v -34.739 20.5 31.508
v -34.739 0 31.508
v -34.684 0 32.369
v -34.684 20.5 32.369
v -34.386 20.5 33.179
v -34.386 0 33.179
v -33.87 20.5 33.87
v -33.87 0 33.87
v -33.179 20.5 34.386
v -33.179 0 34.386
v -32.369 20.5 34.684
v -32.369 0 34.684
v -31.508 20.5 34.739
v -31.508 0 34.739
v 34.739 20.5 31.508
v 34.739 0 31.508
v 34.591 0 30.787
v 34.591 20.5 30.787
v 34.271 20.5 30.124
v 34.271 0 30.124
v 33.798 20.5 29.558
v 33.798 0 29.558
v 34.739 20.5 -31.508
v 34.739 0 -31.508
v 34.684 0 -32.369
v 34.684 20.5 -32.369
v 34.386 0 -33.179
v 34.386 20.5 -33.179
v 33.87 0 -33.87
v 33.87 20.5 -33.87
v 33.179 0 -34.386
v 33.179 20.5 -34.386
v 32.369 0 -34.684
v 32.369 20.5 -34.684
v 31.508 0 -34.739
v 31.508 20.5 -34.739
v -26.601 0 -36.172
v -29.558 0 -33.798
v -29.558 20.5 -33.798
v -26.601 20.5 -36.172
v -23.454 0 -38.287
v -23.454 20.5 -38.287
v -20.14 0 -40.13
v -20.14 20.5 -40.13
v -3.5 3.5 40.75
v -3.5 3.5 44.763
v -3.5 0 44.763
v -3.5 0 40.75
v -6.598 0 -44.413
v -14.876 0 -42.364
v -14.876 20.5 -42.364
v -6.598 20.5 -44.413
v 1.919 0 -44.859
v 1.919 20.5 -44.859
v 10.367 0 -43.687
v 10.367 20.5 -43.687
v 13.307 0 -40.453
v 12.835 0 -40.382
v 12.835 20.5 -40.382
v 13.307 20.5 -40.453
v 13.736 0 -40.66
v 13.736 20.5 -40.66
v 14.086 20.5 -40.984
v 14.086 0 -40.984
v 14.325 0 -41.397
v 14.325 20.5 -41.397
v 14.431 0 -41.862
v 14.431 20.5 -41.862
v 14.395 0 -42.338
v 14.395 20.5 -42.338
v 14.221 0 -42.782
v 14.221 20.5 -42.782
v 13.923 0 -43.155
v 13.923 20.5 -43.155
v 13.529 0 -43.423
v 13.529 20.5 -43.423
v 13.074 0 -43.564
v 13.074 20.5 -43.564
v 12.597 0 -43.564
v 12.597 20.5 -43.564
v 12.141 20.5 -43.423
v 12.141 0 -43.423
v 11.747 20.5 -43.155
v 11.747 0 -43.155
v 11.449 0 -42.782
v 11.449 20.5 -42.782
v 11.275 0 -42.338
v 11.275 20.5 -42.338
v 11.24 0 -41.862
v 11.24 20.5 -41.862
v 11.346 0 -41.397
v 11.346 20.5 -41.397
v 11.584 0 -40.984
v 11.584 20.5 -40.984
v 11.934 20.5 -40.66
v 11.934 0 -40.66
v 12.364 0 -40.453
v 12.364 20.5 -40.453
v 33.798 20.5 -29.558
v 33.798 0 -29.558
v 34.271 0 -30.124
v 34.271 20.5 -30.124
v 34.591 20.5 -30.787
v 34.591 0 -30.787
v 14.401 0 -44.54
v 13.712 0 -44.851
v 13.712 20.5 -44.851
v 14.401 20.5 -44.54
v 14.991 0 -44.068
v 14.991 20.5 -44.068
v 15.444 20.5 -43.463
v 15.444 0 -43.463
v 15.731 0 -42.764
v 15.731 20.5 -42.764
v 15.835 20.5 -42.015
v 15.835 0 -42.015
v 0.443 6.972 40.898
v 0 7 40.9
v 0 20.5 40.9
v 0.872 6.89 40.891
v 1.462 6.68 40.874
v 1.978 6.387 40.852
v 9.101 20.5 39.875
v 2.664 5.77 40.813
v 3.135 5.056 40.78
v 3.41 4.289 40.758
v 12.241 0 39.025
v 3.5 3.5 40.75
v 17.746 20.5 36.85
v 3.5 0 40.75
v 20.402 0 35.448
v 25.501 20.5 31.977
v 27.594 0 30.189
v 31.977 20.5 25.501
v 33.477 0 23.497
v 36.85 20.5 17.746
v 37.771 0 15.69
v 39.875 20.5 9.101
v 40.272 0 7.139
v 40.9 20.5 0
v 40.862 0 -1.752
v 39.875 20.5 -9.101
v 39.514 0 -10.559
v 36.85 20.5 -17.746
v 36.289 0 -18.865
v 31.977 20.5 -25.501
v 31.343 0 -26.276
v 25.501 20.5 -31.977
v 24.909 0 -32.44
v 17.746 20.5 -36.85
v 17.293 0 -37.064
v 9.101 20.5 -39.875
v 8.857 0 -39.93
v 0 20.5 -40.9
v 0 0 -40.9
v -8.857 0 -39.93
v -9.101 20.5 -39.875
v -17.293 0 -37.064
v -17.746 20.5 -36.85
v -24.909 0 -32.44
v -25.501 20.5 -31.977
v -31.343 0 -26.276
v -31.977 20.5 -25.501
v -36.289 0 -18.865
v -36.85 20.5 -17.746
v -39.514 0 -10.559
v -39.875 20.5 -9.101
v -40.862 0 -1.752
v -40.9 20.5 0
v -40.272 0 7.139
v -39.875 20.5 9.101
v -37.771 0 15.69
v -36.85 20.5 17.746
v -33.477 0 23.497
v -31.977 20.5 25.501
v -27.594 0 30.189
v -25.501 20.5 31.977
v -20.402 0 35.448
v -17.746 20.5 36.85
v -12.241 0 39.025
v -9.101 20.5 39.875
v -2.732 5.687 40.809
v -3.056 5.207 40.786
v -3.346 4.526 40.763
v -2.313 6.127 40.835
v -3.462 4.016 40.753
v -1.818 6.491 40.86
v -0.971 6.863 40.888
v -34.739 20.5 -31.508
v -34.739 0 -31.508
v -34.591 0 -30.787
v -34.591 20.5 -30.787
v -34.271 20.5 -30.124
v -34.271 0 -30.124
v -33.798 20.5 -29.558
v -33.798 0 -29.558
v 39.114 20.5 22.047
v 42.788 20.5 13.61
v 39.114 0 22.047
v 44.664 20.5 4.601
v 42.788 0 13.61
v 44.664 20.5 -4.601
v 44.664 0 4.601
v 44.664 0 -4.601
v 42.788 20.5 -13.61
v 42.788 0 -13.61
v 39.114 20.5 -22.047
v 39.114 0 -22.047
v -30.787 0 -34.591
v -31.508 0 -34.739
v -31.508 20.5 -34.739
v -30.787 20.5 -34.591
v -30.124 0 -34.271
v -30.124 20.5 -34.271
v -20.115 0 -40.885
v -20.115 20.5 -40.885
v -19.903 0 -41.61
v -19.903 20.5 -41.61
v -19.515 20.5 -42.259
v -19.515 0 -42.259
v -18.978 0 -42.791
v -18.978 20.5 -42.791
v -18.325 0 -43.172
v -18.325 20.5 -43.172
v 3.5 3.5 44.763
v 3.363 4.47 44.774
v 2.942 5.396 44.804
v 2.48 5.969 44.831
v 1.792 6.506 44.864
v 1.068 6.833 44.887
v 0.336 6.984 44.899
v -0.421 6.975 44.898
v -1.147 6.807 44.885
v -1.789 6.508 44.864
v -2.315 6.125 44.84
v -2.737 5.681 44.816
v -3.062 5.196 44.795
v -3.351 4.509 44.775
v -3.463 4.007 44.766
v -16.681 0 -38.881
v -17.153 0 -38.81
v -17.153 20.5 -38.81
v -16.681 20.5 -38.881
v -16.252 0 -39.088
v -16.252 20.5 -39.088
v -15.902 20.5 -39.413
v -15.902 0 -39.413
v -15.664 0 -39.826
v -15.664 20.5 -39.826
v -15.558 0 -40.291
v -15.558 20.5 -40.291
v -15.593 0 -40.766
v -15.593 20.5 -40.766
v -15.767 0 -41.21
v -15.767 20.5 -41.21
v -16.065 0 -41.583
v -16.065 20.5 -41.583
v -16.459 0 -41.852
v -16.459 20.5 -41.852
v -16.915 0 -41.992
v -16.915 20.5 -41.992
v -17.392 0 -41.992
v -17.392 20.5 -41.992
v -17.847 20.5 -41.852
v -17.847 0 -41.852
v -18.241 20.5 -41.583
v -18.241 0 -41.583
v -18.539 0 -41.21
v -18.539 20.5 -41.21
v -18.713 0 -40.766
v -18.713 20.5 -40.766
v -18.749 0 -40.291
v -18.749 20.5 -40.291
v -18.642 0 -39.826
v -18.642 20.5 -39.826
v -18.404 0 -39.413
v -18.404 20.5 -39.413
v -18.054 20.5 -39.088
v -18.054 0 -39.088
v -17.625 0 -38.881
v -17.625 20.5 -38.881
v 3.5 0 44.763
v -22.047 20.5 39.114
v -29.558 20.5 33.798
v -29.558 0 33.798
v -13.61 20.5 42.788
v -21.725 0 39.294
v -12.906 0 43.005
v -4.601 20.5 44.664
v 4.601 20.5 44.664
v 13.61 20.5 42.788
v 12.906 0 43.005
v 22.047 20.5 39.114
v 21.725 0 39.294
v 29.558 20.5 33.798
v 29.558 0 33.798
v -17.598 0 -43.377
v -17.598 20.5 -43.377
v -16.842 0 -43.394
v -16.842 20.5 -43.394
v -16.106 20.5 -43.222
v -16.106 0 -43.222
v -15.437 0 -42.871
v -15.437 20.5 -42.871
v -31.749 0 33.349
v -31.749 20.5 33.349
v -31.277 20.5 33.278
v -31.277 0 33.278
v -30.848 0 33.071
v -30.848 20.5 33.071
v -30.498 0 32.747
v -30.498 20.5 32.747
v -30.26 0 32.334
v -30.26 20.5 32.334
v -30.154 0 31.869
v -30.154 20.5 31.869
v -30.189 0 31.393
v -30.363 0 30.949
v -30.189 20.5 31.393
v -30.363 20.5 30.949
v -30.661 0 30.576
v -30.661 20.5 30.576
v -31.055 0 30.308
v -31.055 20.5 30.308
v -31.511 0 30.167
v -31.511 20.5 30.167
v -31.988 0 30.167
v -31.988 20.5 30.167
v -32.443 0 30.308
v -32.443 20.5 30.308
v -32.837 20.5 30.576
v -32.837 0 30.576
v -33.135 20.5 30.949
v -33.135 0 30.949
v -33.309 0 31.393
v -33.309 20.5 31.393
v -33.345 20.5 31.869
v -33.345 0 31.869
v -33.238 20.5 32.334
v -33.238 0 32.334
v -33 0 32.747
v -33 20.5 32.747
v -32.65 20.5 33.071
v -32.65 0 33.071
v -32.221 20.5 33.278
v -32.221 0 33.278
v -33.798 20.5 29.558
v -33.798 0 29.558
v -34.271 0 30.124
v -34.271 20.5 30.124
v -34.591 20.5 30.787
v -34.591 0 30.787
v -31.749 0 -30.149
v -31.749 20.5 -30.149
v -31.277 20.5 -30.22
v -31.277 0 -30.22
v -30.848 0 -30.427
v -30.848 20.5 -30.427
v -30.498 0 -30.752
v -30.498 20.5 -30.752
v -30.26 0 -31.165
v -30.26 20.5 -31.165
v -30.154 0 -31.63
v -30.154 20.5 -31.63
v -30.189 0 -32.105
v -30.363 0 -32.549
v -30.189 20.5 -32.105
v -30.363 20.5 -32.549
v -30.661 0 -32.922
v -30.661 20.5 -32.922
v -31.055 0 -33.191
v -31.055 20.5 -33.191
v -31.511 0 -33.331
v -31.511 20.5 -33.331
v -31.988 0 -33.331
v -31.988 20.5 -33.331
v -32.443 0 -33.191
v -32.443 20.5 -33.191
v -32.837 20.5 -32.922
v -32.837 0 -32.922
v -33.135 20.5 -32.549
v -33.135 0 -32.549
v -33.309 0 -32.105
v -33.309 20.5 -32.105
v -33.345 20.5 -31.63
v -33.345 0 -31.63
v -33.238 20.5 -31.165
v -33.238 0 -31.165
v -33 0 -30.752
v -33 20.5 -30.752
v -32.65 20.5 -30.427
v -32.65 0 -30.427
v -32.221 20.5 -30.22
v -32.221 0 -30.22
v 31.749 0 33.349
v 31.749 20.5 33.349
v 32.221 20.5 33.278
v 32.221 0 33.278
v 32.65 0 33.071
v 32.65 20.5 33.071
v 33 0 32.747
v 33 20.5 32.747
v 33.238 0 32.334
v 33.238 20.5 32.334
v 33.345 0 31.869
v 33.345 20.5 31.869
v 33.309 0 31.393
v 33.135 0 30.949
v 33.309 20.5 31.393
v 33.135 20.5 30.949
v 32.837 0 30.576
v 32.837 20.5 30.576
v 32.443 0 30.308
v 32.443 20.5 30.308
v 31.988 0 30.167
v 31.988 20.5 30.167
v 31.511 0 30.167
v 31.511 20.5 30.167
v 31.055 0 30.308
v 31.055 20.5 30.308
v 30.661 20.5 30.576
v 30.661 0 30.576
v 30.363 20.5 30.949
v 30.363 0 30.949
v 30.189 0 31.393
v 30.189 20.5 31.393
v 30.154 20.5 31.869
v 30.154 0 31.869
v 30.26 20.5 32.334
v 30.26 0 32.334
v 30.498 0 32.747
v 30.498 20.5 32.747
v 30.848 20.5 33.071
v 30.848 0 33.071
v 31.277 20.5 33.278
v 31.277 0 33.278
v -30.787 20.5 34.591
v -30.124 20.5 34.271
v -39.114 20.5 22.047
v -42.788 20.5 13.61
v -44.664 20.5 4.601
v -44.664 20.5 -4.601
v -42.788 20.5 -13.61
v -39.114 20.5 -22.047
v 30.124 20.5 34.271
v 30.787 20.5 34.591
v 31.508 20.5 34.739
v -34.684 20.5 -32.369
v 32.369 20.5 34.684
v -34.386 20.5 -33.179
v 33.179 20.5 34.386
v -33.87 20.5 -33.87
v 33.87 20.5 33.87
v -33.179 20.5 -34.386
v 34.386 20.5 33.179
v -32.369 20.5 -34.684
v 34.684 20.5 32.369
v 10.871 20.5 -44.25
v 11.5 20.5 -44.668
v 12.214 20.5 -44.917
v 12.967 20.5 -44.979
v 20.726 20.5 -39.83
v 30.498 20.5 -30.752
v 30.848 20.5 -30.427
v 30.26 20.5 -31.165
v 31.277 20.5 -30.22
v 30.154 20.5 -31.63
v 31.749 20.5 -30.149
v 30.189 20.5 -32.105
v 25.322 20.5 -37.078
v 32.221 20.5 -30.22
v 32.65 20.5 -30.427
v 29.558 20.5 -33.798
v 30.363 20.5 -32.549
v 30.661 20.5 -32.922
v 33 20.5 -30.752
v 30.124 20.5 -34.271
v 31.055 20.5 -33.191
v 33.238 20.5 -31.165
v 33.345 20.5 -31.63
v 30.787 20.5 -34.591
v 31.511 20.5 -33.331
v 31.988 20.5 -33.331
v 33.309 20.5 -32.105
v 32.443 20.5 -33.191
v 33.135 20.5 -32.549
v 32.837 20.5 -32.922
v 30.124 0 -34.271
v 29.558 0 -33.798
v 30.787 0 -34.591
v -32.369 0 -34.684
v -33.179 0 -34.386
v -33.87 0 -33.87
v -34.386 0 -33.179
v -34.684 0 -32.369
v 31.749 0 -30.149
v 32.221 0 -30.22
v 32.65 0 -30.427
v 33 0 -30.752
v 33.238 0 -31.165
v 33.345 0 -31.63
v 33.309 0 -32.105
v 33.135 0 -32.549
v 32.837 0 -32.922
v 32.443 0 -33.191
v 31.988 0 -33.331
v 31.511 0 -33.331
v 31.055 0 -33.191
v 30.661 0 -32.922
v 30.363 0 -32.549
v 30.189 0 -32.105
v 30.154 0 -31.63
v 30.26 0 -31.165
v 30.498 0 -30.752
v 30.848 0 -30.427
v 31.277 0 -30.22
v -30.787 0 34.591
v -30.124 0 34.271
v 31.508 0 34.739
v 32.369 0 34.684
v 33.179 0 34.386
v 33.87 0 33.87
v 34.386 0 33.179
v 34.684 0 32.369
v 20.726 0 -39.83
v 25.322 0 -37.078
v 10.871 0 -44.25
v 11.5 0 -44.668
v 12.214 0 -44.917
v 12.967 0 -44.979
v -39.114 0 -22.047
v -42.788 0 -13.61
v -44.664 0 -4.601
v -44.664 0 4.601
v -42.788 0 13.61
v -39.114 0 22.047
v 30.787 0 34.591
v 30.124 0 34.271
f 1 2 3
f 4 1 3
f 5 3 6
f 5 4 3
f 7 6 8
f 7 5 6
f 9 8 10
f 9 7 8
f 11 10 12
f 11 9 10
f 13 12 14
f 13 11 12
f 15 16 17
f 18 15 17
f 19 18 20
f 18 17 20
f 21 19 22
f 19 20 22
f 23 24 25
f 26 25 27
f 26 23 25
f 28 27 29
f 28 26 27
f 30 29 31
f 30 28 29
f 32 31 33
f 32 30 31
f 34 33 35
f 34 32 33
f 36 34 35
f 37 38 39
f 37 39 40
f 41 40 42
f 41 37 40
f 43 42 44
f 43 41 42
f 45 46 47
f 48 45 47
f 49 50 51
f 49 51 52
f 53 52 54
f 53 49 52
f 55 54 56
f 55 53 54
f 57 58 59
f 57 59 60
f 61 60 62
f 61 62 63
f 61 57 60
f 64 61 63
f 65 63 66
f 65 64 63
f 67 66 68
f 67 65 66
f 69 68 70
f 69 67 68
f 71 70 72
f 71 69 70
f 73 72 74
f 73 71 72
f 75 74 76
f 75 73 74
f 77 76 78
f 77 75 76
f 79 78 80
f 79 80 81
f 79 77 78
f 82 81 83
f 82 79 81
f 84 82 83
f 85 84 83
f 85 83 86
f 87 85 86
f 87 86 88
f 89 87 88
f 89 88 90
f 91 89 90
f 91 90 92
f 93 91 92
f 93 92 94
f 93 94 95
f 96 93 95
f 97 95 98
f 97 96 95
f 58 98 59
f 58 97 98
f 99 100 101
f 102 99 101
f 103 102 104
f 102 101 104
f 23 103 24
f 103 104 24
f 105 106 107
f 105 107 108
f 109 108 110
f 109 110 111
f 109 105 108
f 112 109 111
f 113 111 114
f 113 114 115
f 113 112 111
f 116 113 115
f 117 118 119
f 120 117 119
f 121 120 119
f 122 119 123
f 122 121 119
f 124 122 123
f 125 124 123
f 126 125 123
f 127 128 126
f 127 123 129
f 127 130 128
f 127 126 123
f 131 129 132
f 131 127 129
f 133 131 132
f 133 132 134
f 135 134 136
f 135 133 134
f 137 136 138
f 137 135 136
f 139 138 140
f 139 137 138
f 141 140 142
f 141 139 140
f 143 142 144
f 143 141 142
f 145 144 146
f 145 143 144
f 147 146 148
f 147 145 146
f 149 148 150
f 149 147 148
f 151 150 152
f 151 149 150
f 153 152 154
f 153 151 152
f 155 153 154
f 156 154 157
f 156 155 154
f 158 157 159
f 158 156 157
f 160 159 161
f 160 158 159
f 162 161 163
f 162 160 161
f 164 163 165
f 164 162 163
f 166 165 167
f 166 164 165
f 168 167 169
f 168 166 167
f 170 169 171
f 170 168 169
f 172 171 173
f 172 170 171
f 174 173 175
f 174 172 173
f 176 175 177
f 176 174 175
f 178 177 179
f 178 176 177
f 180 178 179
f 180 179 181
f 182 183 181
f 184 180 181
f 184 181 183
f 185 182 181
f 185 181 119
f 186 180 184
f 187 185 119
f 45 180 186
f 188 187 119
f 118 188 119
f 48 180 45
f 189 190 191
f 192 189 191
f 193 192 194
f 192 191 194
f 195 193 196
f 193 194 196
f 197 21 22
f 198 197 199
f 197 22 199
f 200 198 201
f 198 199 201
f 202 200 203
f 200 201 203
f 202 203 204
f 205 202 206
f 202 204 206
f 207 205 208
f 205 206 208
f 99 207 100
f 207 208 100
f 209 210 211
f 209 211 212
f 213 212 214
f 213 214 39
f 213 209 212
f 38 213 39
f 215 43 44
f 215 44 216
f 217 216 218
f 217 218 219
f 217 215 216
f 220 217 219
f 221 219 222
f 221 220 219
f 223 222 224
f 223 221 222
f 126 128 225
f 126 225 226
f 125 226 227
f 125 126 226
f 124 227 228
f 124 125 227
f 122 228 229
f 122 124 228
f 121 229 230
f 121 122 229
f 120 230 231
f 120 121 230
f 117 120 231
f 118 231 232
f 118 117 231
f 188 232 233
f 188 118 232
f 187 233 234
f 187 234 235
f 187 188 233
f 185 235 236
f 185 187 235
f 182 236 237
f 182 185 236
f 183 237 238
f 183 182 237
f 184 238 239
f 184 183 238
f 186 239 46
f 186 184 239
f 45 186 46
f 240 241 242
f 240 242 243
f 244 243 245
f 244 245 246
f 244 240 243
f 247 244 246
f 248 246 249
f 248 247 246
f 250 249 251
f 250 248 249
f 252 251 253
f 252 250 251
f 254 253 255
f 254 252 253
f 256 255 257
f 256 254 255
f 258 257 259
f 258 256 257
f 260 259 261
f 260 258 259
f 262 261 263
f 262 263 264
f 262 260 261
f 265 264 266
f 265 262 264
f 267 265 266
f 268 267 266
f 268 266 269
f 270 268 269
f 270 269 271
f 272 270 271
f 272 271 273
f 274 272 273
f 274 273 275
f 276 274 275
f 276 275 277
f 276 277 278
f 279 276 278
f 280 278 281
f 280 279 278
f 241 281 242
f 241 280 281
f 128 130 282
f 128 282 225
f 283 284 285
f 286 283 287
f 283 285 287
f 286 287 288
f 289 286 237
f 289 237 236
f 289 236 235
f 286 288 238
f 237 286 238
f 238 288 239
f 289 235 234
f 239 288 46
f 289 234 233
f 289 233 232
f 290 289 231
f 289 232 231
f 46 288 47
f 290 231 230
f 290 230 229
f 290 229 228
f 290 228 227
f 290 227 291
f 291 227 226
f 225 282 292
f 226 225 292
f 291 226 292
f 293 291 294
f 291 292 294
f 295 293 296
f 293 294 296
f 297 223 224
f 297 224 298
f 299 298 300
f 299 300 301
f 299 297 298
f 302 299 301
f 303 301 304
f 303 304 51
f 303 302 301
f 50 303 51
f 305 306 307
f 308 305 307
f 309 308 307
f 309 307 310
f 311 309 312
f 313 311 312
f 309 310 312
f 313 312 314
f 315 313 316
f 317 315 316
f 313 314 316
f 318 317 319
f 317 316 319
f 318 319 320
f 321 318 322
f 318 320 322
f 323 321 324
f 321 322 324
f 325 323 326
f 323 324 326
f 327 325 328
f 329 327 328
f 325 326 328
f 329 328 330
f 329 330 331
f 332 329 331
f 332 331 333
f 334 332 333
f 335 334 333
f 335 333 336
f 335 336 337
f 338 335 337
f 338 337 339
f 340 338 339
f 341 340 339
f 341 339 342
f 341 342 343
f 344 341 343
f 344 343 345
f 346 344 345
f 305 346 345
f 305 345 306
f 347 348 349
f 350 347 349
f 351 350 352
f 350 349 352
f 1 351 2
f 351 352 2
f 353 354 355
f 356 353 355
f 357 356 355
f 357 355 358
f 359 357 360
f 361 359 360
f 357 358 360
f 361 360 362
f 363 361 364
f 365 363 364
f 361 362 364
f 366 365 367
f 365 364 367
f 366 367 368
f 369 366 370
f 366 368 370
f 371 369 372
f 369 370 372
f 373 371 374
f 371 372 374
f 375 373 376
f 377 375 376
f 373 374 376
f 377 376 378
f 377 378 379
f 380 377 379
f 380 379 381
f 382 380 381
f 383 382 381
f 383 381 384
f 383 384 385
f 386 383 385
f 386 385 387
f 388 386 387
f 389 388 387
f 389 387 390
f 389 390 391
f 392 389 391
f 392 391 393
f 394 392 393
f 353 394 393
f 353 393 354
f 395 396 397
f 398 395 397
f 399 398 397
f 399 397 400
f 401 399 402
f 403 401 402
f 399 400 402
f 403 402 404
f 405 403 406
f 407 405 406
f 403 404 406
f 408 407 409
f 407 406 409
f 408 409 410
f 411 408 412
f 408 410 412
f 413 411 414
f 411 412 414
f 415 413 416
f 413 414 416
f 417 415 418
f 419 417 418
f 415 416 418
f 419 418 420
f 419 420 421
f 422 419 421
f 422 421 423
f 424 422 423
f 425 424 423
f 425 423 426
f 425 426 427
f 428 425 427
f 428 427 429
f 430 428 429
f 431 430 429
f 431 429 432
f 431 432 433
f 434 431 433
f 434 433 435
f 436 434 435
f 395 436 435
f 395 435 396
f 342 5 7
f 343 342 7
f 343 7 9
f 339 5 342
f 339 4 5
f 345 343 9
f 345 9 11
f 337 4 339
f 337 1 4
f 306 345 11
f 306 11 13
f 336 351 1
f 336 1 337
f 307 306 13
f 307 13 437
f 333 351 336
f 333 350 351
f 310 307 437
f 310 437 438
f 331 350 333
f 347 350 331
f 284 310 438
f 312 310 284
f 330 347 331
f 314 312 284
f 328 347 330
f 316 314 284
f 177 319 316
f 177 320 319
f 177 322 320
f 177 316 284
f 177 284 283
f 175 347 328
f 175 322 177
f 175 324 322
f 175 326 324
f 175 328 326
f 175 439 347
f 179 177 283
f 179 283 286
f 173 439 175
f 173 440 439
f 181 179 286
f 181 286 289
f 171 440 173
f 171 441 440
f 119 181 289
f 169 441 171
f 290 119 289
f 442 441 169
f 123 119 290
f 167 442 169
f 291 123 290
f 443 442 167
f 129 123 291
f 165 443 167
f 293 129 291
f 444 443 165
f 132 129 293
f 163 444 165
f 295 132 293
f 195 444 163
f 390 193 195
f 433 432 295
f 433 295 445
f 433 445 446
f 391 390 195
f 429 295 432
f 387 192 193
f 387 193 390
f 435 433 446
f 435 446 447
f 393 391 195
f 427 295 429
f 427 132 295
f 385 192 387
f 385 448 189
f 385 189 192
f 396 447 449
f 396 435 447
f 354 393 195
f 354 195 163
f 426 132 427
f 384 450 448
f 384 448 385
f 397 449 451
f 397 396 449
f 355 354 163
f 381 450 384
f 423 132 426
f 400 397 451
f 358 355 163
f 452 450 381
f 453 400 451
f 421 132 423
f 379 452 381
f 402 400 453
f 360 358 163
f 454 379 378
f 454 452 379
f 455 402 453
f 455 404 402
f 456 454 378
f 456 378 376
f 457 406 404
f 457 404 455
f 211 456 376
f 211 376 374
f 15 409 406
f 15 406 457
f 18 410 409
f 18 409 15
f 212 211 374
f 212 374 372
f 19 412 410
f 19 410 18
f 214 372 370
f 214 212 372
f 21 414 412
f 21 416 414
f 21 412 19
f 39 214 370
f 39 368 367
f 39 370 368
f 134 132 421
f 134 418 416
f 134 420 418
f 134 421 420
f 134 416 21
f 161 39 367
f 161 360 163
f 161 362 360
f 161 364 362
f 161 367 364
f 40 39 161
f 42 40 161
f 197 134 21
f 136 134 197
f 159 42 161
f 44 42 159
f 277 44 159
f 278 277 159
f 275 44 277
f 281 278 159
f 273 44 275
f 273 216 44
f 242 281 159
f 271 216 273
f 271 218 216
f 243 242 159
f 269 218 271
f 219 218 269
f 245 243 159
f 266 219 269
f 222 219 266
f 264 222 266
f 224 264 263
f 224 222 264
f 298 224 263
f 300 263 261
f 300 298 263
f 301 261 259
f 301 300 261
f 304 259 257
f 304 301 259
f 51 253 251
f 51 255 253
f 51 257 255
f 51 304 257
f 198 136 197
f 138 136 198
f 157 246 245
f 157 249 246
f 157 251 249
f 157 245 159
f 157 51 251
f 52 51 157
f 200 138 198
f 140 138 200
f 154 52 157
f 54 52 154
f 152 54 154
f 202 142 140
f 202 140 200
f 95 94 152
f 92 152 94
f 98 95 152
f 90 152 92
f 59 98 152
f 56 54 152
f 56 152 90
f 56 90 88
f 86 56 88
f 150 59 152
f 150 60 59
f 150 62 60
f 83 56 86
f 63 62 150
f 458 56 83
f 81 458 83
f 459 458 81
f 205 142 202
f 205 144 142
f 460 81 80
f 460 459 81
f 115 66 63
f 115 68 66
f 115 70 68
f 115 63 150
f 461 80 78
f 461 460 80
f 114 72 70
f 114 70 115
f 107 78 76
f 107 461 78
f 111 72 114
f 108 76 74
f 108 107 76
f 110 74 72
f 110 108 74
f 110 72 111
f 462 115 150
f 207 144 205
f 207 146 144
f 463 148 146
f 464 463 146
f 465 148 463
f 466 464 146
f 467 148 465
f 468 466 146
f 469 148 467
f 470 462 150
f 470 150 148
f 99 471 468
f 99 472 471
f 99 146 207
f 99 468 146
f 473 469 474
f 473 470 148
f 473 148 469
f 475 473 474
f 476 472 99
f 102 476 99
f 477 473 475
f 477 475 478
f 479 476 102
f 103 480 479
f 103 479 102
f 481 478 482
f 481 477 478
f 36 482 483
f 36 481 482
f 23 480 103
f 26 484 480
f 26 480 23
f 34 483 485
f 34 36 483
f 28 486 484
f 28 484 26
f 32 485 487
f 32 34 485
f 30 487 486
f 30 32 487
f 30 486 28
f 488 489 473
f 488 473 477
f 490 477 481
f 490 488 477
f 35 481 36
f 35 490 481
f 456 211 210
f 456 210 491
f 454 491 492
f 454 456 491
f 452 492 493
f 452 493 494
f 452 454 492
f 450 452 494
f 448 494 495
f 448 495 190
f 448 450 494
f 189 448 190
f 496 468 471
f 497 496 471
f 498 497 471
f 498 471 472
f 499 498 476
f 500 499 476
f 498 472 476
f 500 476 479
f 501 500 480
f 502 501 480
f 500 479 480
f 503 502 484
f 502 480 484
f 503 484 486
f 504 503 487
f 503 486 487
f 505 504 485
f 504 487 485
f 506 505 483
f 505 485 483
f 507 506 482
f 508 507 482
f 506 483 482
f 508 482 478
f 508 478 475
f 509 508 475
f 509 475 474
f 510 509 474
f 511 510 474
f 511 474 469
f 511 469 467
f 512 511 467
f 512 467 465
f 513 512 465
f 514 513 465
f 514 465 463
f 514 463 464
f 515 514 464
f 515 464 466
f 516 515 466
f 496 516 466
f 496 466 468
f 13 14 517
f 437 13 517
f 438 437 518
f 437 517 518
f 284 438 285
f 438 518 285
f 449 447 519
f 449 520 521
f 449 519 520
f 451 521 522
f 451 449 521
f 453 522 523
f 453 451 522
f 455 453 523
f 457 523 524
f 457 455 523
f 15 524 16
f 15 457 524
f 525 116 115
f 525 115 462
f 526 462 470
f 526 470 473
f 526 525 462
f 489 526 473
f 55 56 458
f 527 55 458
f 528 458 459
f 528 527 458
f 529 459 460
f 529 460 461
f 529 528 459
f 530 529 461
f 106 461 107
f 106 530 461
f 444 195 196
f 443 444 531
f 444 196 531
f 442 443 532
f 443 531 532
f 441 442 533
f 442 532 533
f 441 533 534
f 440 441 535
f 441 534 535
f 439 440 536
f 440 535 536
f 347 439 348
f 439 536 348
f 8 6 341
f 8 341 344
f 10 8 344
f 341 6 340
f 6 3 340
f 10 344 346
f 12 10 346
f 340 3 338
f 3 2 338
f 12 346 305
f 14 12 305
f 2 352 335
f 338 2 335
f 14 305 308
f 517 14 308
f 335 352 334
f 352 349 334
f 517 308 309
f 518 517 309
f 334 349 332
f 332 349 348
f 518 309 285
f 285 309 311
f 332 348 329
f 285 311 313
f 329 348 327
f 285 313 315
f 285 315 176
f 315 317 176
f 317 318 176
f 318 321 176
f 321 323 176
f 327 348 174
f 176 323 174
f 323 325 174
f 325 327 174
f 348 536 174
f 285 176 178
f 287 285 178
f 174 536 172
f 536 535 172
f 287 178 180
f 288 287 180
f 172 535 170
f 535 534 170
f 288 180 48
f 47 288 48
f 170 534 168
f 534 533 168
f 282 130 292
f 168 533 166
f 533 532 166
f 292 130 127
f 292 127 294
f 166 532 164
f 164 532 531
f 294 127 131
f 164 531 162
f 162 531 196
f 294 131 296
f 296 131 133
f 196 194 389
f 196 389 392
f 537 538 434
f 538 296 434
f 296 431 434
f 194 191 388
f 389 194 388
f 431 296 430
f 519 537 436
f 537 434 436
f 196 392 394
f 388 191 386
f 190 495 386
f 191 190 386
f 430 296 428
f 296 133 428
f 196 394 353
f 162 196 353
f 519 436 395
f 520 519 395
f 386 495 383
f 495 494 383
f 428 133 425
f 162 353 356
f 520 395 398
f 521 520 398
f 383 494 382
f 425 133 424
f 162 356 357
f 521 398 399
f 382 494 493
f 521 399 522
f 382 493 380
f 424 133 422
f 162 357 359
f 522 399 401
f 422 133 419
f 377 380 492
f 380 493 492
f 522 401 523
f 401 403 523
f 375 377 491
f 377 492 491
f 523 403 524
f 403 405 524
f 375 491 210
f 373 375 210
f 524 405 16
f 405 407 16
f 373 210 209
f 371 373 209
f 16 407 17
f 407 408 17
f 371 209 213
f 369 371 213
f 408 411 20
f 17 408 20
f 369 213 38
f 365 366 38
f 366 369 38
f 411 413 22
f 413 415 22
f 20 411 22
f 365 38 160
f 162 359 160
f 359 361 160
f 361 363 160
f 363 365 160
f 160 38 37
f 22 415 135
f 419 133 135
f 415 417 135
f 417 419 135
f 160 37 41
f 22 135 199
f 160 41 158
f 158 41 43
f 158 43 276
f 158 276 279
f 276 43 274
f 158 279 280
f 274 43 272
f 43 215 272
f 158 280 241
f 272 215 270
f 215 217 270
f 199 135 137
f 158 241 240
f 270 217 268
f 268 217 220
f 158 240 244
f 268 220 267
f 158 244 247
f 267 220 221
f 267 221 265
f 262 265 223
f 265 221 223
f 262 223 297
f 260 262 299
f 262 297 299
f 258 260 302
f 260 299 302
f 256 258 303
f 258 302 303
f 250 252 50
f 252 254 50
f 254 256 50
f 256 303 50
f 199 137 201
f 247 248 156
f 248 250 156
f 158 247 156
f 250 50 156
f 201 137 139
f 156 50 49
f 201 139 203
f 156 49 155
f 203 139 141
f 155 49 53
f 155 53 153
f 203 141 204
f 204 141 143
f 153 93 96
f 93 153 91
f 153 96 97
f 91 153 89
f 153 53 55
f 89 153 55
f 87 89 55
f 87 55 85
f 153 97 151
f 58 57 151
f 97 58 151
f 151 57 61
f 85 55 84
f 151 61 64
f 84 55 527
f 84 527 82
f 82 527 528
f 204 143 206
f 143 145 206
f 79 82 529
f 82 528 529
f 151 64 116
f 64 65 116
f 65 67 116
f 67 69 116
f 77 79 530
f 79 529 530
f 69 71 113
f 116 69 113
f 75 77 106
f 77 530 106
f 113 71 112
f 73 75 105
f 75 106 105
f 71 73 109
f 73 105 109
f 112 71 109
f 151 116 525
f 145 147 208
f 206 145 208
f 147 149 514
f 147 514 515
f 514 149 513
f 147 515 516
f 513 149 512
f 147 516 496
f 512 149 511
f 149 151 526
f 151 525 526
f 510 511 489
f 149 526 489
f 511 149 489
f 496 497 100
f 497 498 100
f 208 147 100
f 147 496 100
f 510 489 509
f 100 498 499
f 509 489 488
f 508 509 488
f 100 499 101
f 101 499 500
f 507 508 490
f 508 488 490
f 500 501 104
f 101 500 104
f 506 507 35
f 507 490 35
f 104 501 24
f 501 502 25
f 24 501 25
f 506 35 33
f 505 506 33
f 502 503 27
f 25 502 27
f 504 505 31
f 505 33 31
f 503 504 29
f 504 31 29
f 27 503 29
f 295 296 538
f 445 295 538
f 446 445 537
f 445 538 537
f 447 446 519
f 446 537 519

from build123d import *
from build123d.topology import SkipClean

# Parameters (mm, degrees)
SKETCH_1_R          = 46.9
SKETCH_1_R_2        = 40.9
SKETCH_1_R_3        = 1.6
EXTRUDE_1_DEPTH     = 20.5
SKETCH_2_R          = 3
EXTRUDE_2_DEPTH     = 20.5
SKETCH_3_R          = 1.6
CUT_EXTRUDE_1_DEPTH = 25
CUT_EXTRUDE_START   = -25
CUT_EXTRUDE_2_DEPTH = 25
CUT_EXTRUDE_3_DEPTH = 67.780389508


with BuildPart() as part:
    # 草图1 → 凸台-拉伸1 (new body)
    with BuildSketch(Plane(origin=(0, 0, 0), x_dir=(1, 0, 0), z_dir=(0, 1, 0))):
        with Locations(Location((0, 0, 0), (0, 0, 270))):
            Circle(SKETCH_1_R)
        with Locations(Location((0, 0, 0), (0, 0, 270))):
            Circle(SKETCH_1_R_2, mode=Mode.SUBTRACT)
        with Locations(Location((12.835117837, 41.981778787, 0), (0, 0, 270))):
            Circle(SKETCH_1_R_3, mode=Mode.SUBTRACT)
        with Locations(Location((-17.153096541, 40.410163067, 0), (0, 0, 270))):
            Circle(SKETCH_1_R_3, mode=Mode.SUBTRACT)
    extrude(amount=EXTRUDE_1_DEPTH)

    # 草图2 → 凸台-拉伸2 (add)
    with BuildSketch(Plane(origin=(0, 20.5, 0), x_dir=(1, 0, 0), z_dir=(0, 1, 0))):
        with Locations((31.749094475, 31.749094475)):
            Circle(SKETCH_2_R)
        with Locations((31.749094475, -31.749094475)):
            Circle(SKETCH_2_R)
        with Locations((-31.749094475, -31.749094475)):
            Circle(SKETCH_2_R)
        with Locations((-31.749094475, 31.749094475)):
            Circle(SKETCH_2_R)
    extrude(amount=-EXTRUDE_2_DEPTH)

    # 草图3 → 切除-拉伸1 (cut)
    with BuildSketch(Plane(origin=(0, 20.5, 0), x_dir=(1, 0, 0), z_dir=(0, 1, 0))):
        with Locations(Location((-31.749094475, 31.749094475, 0), (0, 0, 270))):
            Circle(SKETCH_3_R)
        with Locations(Location((-31.749094475, -31.749094475, 0), (0, 0, 270))):
            Circle(SKETCH_3_R)
        with Locations(Location((31.749094475, -31.749094475, 0), (0, 0, 270))):
            Circle(SKETCH_3_R)
        with Locations(Location((31.749094475, 31.749094475, 0), (0, 0, 270))):
            Circle(SKETCH_3_R)
    extrude(amount=-CUT_EXTRUDE_1_DEPTH, mode=Mode.SUBTRACT)

    # 草图4 → 切除-拉伸2 (cut)
    with SkipClean():  # the faces are left unmerged after this step: merging them gives an invalid solid
        with BuildSketch(Plane(origin=(0, 20.5, 0), x_dir=(1, 0, 0), z_dir=(0, 1, 0)).offset(CUT_EXTRUDE_START)):
            with BuildLine():
                ThreePointArc((-20.139957039, 40.129691383), (-19.729499495, 41.947091113), (-18.325289788, 43.171677686))
                ThreePointArc((-18.325289788, 43.171677686), (-25.271051327, 39.509289602), (-31.508446668, 34.739427004))
                ThreePointArc((-31.508446668, 34.739427004), (-30.445394472, 34.451013479), (-29.558090066, 33.798362559))
                ThreePointArc((-29.558090066, 33.798362559), (-25.049858336, 37.262777638), (-20.139957039, 40.129691383))
            make_face()
            with BuildLine():
                ThreePointArc((10.366766227, 43.686841932), (11.849397191, 44.815213947), (13.71223353, 44.850692878))
                ThreePointArc((13.71223353, 44.850692878), (-2.454555971, 46.8357252), (-18.325289788, 43.171677686))
                ThreePointArc((-18.325289788, 43.171677686), (-16.468950031, 43.331112151), (-14.876494449, 42.363898698))
                ThreePointArc((-14.876494449, 42.363898698), (-2.349884435, 44.83846611), (10.366766227, 43.686841932))
            make_face()
            with BuildLine():
                ThreePointArc((29.558090066, 33.798362559), (30.445394472, 34.451013479), (31.508446668, 34.739427004))
                ThreePointArc((31.508446668, 34.739427004), (23.168662106, 40.777727943), (13.71223353, 44.850692878))
                ThreePointArc((13.71223353, 44.850692878), (15.236754486, 43.77959452), (15.834933275, 42.015055494))
                ThreePointArc((15.834933275, 42.015055494), (23.065345276, 38.522718586), (29.558090066, 33.798362559))
            make_face()
            with BuildLine():
                ThreePointArc((33.798362559, -29.558090066), (44.9, 0), (33.798362559, 29.558090066))
                ThreePointArc((33.798362559, 29.558090066), (34.451013479, 30.445394472), (34.739427004, 31.508446668))
                ThreePointArc((34.739427004, 31.508446668), (46.9, 0), (34.739427004, -31.508446668))
                ThreePointArc((34.739427004, -31.508446668), (34.451013479, -30.445394472), (33.798362559, -29.558090066))
            make_face()
            with BuildLine():
                ThreePointArc((-33.798362559, -29.558090066), (-34.451013479, -30.445394472), (-34.739427004, -31.508446668))
                ThreePointArc((-34.739427004, -31.508446668), (-46.9, 0), (-34.739427004, 31.508446668))
                ThreePointArc((-34.739427004, 31.508446668), (-34.451013479, 30.445394472), (-33.798362559, 29.558090066))
                ThreePointArc((-33.798362559, 29.558090066), (-44.9, 0), (-33.798362559, -29.558090066))
            make_face()
            with BuildLine():
                ThreePointArc((-31.508446668, -34.739427004), (-30.445394472, -34.451013479), (-29.558090066, -33.798362559))
                ThreePointArc((-29.558090066, -33.798362559), (0, -44.9), (29.558090066, -33.798362559))
                ThreePointArc((29.558090066, -33.798362559), (30.445394472, -34.451013479), (31.508446668, -34.739427004))
                ThreePointArc((31.508446668, -34.739427004), (0, -46.9), (-31.508446668, -34.739427004))
            make_face()
        extrude(amount=CUT_EXTRUDE_2_DEPTH, mode=Mode.SUBTRACT)

    # 草图5 → 切除-拉伸3 (cut, through all)
    with SkipClean():  # the faces are left unmerged after this step: merging them gives an invalid solid
        with BuildSketch(Plane.XY):
            with BuildLine():
                Line((-3.5, 3.5), (-3.5, 0))
                Line((-3.5, 0), (3.5, 0))
                Line((3.5, 0), (3.5, 3.5))
                ThreePointArc((3.5, 3.5), (0, 7), (-3.5, 3.5))
            make_face()
        extrude(amount=CUT_EXTRUDE_3_DEPTH, mode=Mode.SUBTRACT)


solid = part.part
